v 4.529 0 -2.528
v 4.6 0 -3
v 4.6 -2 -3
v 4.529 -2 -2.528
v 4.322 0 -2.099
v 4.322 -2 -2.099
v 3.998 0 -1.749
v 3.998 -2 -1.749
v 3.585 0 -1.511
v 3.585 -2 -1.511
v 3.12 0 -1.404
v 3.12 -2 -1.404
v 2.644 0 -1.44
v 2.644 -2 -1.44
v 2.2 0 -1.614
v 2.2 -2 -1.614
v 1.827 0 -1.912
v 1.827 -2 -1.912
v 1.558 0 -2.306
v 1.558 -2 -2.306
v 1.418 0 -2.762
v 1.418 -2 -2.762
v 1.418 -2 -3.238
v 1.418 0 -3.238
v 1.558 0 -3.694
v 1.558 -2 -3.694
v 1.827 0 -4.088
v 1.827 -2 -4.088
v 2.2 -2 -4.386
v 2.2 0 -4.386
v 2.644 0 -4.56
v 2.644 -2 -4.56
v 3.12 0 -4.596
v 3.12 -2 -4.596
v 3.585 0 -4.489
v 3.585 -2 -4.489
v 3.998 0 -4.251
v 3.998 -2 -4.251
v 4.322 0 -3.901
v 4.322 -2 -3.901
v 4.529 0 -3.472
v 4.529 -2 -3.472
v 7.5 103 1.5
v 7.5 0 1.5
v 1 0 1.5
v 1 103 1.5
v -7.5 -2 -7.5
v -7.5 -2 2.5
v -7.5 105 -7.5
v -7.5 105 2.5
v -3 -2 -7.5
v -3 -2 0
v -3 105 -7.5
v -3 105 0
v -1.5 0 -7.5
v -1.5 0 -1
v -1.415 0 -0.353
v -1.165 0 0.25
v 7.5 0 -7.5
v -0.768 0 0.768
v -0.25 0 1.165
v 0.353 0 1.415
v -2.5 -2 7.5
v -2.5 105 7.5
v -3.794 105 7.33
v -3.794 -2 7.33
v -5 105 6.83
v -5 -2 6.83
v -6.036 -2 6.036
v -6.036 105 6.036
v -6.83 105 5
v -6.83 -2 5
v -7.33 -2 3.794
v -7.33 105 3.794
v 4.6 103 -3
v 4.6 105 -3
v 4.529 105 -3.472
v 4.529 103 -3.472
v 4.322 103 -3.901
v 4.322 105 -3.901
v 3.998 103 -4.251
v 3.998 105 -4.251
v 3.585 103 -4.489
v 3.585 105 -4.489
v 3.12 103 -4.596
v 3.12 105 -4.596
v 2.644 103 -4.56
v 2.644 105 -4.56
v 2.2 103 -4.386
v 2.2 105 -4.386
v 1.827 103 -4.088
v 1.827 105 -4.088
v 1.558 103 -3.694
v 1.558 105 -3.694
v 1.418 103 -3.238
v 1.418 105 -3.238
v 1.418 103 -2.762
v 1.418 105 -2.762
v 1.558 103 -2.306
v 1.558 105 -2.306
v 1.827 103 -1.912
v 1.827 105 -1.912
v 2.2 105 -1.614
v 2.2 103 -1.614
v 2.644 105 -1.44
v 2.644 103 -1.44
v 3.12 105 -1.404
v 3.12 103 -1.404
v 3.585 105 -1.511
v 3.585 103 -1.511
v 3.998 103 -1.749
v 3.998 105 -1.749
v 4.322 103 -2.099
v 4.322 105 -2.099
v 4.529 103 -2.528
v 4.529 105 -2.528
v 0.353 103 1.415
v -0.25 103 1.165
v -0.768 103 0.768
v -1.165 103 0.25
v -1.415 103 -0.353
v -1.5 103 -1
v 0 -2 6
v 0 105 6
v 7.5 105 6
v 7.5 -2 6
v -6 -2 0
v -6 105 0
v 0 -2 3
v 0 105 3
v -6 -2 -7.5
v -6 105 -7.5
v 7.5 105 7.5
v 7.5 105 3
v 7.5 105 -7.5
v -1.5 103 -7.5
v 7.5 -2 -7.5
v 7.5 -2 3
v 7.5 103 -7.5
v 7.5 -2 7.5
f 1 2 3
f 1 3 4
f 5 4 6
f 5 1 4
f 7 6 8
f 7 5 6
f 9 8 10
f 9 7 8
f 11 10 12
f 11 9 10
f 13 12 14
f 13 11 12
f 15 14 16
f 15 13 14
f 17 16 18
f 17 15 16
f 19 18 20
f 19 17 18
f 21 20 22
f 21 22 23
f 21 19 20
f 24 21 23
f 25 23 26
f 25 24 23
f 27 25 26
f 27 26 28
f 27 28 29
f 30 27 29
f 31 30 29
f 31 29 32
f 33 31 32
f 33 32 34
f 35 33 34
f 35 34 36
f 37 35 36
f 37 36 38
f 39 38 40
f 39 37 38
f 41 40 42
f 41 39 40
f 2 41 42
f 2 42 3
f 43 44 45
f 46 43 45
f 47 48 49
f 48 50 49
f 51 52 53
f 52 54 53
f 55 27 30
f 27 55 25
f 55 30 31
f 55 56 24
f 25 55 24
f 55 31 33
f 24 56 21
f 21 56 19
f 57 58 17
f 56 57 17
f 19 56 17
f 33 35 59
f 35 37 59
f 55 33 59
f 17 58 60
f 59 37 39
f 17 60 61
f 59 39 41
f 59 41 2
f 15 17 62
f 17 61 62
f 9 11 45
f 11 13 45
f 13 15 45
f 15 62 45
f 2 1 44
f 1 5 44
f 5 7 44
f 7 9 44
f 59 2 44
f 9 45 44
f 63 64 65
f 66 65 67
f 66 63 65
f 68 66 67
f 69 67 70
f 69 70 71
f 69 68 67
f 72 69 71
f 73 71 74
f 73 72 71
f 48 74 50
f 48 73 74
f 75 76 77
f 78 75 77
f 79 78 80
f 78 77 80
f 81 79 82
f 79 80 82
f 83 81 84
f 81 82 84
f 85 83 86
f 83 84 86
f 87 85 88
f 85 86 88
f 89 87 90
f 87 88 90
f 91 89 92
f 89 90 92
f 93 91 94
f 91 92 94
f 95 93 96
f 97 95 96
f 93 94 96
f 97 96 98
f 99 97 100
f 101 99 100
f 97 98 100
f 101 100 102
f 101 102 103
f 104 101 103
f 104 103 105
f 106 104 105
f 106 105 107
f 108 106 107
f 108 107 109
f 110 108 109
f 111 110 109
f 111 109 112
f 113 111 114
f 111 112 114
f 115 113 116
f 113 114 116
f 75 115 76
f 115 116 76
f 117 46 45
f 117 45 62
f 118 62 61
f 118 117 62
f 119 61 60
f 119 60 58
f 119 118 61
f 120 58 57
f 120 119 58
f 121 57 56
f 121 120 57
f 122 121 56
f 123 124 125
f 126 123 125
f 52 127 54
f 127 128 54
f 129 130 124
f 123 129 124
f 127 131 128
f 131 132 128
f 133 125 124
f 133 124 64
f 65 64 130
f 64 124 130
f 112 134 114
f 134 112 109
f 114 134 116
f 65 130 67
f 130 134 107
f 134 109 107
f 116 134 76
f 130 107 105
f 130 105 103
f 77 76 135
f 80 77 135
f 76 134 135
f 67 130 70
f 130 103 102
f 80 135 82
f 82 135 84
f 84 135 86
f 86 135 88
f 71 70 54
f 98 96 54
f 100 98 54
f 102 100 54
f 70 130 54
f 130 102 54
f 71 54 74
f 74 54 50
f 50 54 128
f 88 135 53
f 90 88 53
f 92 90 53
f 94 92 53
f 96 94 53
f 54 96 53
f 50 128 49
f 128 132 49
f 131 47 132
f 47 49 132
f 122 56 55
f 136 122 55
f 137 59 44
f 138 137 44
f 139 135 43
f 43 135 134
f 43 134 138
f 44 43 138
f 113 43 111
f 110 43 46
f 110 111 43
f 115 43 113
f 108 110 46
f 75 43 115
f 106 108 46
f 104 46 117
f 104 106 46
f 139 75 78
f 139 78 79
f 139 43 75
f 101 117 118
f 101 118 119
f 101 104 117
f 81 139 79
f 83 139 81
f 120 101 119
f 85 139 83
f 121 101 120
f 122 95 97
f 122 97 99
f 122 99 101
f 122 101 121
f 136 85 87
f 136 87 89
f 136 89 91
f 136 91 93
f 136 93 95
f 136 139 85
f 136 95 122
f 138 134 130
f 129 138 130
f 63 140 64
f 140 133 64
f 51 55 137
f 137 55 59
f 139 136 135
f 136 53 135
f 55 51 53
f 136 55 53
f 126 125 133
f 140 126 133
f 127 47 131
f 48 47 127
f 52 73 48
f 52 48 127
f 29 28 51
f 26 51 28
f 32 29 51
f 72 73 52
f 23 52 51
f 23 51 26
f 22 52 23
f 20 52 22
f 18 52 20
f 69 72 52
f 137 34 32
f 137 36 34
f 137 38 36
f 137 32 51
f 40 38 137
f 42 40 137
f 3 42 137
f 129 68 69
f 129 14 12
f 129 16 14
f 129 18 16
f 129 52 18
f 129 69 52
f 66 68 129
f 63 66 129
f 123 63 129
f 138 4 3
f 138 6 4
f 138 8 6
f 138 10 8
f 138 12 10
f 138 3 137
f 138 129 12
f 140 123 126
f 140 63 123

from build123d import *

# Parameters (mm, degrees)
BOSS_EXTRUDE1_DEPTH = 105
SKETCH6_R           = 1.6
BOSS_EXTRUDE2_DEPTH = 2
FILLET3_R           = 5
FILLET4_R           = 2.5
SKETCH7_R           = 1.6
BOSS_EXTRUDE3_DEPTH = 2


with BuildPart() as part:
    # Sketch4 → Boss-Extrude1 (new body)
    with BuildSketch(Plane(origin=(0, 0, 0), x_dir=(1, 0, 0), z_dir=(0, 1, 0))):
        Polygon((-7.5, -7.5), (7.5, -7.5), (7.5, -6), (0, -6), (0, -3), (7.5, -3), (7.5, -1.5), (-1.5, -1.5), (-1.5, 7.5), (-3, 7.5), (-3, 0), (-6, 0), (-6, 7.5), (-7.5, 7.5), align=None)
    extrude(amount=BOSS_EXTRUDE1_DEPTH)

    # Sketch6 → Boss-Extrude2 (add)
    with BuildSketch(Plane.XZ):
        Polygon((7.5, 7.5), (-7.5, 7.5), (-7.5, -7.5), (-6, -7.5), (-6, 0), (-3, 0), (-3, -7.5), (-1.5, -7.5), (7.5, -7.5), (7.5, 1.5), (7.5, 3), (0, 3), (0, 6), (7.5, 6), align=None)
        with Locations((3, -3)):
            Circle(SKETCH6_R, mode=Mode.SUBTRACT)
    extrude(amount=BOSS_EXTRUDE2_DEPTH)

    # Fillet3
    fillet3_edges = [part.edges().sort_by_distance(p)[0] for p in [
        (-7.5, 51.5, 7.5),
    ]]
    fillet(fillet3_edges, radius=FILLET3_R)

    # Fillet4
    fillet4_edges = [part.edges().sort_by_distance(p)[0] for p in [
        (-1.5, 52.5, 1.5),
    ]]
    fillet(fillet4_edges, radius=FILLET4_R)

    # Sketch7 → Boss-Extrude3 (add)
    with BuildSketch(Plane(origin=(0, 105, 0), x_dir=(1, 0, 0), z_dir=(0, 1, 0))):
        with BuildLine():
            Line((-1.5, 7.5), (7.5, 7.5))
            Line((7.5, 7.5), (7.5, -1.5))
            Line((7.5, -1.5), (1, -1.5))
            ThreePointArc((1, -1.5), (-0.767766953, -0.767766953), (-1.5, 1))
            Line((-1.5, 1), (-1.5, 7.5))
        make_face()
        with Locations((3, 3)):
            Circle(SKETCH7_R, mode=Mode.SUBTRACT)
    extrude(amount=-BOSS_EXTRUDE3_DEPTH)


solid = part.part
